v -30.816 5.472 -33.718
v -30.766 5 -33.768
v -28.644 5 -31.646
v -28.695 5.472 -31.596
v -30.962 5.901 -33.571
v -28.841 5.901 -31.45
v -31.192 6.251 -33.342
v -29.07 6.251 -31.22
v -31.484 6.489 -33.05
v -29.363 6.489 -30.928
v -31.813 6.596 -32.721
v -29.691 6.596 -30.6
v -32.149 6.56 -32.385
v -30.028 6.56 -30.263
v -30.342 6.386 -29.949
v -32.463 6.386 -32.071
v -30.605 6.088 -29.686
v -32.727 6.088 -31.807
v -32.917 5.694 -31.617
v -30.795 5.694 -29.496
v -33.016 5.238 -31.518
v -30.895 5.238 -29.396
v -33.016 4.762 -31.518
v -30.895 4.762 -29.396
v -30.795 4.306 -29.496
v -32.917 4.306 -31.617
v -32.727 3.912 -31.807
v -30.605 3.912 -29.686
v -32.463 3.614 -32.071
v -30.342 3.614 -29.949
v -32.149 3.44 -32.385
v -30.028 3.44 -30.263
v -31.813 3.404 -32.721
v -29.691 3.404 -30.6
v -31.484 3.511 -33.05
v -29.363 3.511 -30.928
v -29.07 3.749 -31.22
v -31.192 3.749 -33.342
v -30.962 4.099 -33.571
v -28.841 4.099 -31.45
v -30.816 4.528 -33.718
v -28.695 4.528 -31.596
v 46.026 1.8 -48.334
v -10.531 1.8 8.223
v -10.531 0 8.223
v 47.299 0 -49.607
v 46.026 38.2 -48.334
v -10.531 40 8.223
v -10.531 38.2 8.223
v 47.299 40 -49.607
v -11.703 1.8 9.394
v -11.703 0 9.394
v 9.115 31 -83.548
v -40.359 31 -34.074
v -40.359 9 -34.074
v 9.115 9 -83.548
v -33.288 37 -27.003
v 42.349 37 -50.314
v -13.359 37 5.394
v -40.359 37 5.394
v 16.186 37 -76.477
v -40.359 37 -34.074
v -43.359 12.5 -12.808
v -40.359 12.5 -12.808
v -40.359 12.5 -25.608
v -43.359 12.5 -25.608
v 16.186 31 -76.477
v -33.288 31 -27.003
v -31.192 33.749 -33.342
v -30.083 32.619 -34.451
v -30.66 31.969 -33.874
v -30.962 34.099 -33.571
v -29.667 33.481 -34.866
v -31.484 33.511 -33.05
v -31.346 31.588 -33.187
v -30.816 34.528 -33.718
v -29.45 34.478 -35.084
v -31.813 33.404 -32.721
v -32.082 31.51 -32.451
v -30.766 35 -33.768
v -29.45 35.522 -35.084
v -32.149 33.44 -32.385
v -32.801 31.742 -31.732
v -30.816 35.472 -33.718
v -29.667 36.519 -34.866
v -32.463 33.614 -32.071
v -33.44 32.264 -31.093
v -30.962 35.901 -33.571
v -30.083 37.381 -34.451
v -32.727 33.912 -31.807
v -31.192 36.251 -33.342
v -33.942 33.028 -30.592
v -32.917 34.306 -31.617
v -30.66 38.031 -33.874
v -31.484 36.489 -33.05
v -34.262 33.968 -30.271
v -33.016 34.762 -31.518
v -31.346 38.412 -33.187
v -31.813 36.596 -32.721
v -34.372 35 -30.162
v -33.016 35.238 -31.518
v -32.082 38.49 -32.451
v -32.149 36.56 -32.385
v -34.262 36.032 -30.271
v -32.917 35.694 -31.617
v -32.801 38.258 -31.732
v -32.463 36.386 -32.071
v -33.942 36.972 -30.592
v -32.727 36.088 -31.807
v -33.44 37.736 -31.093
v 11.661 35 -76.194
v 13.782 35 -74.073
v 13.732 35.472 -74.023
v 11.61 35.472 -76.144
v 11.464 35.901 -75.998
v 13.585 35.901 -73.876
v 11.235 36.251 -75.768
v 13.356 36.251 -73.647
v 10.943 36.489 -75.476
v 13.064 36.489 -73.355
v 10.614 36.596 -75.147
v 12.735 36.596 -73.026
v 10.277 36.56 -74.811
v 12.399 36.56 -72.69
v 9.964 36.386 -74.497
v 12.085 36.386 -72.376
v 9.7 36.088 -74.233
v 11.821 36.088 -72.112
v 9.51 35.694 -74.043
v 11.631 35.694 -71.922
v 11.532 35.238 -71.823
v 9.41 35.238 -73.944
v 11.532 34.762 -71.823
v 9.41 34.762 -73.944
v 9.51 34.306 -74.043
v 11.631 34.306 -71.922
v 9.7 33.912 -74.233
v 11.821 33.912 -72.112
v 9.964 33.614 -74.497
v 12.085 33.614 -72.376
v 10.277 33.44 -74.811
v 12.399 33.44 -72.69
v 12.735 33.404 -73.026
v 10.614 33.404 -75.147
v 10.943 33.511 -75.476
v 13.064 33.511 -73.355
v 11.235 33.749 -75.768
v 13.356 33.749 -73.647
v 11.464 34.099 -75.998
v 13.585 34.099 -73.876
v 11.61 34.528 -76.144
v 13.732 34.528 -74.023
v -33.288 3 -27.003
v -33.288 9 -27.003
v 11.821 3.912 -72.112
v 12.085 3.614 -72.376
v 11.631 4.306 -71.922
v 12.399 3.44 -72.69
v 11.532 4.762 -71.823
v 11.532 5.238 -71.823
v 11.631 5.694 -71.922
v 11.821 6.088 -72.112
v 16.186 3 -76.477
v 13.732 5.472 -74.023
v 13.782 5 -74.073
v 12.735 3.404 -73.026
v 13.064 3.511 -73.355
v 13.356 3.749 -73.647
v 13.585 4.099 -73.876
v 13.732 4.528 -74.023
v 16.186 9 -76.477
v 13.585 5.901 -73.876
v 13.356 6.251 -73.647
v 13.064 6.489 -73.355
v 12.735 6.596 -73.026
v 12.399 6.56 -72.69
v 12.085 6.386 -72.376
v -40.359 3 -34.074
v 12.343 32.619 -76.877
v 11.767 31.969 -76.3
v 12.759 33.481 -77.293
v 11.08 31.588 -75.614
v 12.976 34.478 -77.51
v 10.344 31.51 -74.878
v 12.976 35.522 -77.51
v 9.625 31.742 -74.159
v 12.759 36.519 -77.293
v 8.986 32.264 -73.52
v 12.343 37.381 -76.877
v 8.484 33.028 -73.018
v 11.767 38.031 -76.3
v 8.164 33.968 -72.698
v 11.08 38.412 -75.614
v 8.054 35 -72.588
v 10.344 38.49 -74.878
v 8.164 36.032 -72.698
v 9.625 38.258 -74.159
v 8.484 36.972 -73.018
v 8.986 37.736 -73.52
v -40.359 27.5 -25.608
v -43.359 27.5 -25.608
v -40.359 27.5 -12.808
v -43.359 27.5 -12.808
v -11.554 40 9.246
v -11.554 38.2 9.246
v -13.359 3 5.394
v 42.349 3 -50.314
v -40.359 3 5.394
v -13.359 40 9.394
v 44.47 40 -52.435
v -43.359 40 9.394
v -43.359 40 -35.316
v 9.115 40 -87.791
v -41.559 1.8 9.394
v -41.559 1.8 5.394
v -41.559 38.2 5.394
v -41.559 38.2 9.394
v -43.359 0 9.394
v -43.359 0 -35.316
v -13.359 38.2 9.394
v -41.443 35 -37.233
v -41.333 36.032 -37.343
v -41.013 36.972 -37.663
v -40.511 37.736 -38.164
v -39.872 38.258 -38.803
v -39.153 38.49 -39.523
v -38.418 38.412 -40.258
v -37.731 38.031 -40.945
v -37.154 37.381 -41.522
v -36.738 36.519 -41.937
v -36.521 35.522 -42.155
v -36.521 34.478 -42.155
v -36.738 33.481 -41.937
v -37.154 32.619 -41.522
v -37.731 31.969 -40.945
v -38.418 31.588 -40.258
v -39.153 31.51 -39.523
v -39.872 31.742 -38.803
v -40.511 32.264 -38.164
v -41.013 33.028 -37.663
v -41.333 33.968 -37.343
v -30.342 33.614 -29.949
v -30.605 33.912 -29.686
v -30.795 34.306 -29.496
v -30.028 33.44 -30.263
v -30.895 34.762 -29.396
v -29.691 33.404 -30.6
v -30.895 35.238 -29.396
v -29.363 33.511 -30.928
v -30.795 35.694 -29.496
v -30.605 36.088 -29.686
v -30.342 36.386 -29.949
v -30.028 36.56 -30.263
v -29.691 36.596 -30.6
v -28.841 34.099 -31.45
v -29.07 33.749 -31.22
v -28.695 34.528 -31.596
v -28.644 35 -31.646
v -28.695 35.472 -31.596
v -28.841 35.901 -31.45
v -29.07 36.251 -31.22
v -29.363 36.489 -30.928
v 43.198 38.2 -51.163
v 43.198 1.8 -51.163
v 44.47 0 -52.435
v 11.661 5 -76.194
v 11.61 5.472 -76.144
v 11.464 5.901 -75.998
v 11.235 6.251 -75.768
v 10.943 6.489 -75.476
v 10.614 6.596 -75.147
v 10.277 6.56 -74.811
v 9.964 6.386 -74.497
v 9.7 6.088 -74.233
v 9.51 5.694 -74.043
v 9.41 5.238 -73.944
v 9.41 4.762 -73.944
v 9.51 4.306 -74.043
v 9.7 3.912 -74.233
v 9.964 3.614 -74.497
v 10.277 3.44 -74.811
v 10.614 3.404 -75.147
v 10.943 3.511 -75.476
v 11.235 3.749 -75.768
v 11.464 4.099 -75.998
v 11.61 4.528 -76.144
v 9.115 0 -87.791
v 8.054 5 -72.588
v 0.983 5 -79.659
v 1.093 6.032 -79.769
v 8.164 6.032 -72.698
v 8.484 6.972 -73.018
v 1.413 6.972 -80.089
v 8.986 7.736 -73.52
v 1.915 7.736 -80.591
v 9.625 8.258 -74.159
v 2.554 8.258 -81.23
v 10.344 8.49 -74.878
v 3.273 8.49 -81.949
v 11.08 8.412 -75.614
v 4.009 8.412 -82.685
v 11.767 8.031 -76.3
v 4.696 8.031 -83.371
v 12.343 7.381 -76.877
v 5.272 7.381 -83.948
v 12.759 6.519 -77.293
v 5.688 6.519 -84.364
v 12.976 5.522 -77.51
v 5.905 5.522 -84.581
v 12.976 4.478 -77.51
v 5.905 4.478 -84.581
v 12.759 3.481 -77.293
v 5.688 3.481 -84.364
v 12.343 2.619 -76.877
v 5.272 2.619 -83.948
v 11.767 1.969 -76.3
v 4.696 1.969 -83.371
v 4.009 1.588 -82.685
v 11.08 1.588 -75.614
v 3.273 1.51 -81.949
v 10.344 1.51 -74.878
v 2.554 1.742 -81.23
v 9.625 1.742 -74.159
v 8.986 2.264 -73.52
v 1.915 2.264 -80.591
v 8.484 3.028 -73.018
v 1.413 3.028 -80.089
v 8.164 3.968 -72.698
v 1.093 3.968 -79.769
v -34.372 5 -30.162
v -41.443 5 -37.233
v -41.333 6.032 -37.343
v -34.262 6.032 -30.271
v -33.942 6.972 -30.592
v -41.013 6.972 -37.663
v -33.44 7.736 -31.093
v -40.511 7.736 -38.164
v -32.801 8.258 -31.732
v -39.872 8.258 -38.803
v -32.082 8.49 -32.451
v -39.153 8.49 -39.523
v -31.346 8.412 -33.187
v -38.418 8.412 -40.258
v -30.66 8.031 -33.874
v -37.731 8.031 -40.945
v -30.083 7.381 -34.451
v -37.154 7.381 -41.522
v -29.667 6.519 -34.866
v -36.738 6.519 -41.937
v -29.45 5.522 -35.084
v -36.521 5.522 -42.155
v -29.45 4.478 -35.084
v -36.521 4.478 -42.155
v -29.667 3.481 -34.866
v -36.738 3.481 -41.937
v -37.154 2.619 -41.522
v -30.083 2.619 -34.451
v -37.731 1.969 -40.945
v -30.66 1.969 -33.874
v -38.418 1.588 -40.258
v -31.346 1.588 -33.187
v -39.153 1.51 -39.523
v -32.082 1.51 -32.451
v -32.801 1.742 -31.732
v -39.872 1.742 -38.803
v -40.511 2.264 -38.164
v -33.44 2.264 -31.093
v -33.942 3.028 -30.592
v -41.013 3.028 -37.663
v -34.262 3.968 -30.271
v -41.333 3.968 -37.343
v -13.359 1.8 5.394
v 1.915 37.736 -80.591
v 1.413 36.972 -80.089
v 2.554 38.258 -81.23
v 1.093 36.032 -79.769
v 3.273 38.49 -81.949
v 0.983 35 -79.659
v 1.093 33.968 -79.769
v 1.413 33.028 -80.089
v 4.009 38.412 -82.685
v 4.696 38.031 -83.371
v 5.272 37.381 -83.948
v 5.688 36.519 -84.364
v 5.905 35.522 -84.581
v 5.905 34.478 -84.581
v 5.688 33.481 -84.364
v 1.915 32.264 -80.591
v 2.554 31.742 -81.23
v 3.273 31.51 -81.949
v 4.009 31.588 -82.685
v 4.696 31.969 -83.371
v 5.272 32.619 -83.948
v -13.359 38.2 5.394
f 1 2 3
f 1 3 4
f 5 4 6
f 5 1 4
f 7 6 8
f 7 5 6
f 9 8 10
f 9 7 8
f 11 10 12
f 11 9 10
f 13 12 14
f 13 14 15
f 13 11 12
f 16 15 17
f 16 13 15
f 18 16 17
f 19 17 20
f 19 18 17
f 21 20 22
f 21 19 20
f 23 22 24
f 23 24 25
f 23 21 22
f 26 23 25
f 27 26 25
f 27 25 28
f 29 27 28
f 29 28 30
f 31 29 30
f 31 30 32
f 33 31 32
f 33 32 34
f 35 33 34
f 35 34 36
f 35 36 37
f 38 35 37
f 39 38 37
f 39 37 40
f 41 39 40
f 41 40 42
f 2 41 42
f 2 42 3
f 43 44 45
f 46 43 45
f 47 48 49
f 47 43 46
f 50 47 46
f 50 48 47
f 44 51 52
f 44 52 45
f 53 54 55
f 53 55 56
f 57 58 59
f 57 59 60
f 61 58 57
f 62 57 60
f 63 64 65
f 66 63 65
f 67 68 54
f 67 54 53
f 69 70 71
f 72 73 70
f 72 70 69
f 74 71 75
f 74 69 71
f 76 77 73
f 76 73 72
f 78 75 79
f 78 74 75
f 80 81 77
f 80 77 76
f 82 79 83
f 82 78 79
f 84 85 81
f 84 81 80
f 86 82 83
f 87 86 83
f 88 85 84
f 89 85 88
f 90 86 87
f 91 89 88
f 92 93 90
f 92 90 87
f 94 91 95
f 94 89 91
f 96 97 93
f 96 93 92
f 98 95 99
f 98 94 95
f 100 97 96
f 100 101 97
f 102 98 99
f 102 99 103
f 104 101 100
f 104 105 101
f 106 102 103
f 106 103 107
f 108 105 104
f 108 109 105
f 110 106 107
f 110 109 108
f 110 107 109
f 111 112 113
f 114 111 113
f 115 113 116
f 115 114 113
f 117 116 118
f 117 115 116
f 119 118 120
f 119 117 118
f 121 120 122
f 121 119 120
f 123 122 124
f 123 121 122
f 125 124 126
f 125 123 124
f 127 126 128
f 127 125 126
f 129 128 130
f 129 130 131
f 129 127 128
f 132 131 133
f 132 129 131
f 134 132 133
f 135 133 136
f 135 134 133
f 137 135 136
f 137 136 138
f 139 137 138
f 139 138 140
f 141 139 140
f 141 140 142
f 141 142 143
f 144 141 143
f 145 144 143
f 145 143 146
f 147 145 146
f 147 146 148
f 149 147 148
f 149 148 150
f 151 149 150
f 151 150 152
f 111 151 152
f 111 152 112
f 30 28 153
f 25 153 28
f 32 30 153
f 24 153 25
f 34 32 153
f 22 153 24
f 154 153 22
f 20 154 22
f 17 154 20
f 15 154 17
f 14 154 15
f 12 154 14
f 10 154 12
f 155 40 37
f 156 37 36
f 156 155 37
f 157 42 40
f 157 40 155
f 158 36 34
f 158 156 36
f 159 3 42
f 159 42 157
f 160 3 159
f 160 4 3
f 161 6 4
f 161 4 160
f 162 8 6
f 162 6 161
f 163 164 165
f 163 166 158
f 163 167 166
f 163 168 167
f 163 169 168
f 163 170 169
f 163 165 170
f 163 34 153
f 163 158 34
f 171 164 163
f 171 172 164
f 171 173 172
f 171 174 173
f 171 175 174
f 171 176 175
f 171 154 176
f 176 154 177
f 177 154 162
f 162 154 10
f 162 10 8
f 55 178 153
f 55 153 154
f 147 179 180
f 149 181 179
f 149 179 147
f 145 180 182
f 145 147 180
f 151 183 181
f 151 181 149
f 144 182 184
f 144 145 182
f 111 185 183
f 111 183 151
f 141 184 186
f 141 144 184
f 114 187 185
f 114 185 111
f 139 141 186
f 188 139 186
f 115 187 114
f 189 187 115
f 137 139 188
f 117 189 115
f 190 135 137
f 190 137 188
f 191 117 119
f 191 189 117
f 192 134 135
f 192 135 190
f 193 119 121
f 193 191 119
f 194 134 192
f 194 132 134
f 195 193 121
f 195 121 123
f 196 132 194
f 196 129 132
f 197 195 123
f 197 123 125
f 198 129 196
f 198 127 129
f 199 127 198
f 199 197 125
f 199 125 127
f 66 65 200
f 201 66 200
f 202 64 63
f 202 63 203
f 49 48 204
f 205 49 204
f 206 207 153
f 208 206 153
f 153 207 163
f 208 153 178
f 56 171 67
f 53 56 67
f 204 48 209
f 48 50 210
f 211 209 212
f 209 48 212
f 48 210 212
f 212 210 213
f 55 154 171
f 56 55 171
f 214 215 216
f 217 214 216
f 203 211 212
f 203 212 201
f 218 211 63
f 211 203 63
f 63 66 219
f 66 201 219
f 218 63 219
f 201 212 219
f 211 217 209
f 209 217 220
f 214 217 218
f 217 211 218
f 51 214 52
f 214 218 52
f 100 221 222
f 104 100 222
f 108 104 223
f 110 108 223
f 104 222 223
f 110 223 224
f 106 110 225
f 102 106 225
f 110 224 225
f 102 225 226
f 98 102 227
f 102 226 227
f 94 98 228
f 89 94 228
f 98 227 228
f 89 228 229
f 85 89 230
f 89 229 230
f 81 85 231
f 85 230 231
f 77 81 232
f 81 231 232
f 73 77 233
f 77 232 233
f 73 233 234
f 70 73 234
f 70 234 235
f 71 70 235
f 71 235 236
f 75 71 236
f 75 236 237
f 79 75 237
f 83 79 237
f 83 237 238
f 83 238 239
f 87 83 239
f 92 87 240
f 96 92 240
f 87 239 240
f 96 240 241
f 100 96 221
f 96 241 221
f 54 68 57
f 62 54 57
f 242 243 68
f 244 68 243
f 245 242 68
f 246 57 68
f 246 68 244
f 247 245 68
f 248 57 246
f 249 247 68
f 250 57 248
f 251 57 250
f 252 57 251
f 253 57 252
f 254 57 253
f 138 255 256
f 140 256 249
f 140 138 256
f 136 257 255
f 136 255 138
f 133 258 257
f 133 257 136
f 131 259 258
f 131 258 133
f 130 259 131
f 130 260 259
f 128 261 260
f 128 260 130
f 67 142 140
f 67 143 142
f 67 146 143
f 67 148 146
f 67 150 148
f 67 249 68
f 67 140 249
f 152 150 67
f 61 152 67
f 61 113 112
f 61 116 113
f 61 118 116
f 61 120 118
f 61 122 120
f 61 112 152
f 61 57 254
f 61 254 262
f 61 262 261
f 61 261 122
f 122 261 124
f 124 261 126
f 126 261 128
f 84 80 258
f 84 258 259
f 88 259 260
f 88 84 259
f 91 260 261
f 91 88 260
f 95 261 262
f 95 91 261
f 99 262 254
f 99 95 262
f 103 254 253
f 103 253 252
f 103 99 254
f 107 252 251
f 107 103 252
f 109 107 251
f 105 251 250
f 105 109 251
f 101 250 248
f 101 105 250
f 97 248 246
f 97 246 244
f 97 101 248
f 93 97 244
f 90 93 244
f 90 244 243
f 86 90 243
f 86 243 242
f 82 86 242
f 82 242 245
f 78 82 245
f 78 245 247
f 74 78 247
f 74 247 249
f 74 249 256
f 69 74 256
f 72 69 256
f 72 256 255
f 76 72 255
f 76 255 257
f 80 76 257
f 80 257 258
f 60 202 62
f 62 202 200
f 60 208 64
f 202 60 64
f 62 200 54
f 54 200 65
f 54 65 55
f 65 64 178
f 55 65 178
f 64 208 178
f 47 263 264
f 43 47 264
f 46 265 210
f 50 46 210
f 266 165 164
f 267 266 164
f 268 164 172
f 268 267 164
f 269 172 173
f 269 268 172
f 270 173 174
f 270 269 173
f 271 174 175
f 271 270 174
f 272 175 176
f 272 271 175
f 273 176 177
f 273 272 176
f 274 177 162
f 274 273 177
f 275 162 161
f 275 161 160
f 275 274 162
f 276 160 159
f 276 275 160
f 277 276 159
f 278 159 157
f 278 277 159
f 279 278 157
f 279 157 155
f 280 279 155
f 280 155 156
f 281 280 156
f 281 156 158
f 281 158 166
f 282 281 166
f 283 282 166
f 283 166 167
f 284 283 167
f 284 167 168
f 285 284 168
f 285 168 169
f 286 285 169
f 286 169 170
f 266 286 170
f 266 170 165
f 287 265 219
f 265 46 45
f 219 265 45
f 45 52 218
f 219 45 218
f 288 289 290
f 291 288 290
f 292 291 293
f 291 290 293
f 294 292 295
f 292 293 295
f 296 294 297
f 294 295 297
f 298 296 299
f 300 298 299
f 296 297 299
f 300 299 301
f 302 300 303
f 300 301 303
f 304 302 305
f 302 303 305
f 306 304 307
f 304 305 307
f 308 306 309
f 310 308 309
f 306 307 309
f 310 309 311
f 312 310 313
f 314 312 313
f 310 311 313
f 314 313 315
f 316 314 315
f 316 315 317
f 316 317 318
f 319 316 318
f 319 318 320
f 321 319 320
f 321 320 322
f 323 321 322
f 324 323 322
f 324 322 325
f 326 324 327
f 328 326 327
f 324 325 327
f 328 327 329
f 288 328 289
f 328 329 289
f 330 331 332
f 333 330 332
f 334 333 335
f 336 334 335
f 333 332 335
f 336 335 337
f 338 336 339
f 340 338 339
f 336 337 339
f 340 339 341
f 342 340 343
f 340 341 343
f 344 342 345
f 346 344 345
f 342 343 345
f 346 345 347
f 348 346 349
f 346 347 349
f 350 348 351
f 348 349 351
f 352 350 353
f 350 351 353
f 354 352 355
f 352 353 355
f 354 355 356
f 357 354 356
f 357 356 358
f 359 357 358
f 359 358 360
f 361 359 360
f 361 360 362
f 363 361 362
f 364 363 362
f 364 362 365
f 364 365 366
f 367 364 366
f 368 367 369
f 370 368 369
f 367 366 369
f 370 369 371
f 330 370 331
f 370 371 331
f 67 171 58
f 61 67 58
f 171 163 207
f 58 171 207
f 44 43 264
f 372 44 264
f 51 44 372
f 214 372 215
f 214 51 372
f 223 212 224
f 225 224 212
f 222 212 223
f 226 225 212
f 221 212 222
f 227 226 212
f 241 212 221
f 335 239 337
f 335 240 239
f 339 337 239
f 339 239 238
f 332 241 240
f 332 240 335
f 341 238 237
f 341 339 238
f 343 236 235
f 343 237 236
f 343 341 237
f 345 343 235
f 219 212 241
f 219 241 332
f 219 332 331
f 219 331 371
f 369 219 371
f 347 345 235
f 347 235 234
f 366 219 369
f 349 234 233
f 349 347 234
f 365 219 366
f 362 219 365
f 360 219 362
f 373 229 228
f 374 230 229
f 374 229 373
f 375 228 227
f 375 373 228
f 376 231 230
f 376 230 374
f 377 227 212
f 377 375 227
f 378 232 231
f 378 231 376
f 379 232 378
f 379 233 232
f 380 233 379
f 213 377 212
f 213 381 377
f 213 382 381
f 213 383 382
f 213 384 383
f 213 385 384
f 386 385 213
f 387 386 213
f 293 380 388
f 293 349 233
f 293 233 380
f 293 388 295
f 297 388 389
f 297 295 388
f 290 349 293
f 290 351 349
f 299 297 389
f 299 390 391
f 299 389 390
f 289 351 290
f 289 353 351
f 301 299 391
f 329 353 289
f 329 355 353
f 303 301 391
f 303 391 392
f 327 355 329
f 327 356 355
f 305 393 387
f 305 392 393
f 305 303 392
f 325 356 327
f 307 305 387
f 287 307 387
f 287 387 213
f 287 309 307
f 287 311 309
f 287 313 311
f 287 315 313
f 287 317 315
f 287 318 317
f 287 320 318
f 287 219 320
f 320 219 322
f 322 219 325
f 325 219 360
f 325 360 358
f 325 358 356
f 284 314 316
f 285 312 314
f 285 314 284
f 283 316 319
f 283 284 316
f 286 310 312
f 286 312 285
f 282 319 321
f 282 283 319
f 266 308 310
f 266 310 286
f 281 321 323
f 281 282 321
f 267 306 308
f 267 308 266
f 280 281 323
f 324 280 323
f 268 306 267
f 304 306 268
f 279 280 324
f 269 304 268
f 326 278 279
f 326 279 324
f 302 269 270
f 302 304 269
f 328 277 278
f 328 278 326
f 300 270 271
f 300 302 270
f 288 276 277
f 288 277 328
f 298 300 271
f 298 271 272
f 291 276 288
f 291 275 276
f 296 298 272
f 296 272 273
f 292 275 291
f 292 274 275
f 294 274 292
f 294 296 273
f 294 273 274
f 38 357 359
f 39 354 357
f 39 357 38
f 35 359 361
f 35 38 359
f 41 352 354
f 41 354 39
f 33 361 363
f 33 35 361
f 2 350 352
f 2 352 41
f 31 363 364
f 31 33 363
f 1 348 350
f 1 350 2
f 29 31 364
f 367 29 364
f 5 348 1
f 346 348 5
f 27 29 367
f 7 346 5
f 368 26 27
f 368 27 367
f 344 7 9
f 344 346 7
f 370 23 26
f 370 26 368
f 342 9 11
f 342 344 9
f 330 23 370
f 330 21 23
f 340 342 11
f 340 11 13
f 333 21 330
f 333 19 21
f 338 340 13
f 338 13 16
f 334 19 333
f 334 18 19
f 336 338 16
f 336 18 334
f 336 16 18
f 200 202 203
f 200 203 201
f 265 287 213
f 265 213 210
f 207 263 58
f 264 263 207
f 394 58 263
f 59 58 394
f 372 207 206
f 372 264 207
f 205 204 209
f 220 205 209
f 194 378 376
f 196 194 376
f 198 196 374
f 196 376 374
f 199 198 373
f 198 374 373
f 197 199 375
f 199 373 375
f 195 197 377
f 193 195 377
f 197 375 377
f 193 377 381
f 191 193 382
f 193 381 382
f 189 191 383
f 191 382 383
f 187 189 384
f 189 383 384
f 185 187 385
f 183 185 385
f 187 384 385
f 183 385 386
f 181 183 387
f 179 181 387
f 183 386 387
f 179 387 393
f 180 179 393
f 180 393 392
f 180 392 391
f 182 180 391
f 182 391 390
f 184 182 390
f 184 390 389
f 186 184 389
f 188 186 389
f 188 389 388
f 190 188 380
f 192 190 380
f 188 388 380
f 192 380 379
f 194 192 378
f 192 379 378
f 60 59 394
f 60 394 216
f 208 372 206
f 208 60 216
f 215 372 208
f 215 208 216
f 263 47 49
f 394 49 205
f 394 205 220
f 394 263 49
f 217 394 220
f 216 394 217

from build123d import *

# Parameters (mm, degrees)
BOSS_EXTRUDE1_DEPTH = 40
SHELL1_T            = -3
BOSS_EXTRUDE2_DEPTH = 4
BOSS_EXTRUDE3_DEPTH = 4
BOSS_EXTRUDE4_DEPTH = 1.8
BOSS_EXTRUDE5_DEPTH = 1.8
SKETCH10_R          = 1.65
CUT_EXTRUDE6_DEPTH  = 41.105
SKETCH11_W          = 12.8
SKETCH11_H          = 15
CUT_EXTRUDE7_DEPTH  = 3
SKETCH12_W          = 69.967359313
SKETCH12_H          = 34
SKETCH12_R          = 1.6
BOSS_EXTRUDE7_DEPTH = 10
SKETCH13_R          = 3.5
CUT_EXTRUDE9_DEPTH  = 10
SKETCH14_W          = 69.967359313
SKETCH14_H          = 22
CUT_EXTRUDE10_DEPTH = 10


with BuildPart() as part:
    # Sketch1 → Boss-Extrude1 (new body)
    with BuildSketch(Plane(origin=(0, 0, 0), x_dir=(1, 0, 0), z_dir=(0, 1, 0))):
        Polygon((-43.359374855, -5.394325428), (-43.359374855, 35.316352691), (9.115019377, 87.790746923), (44.470358437, 52.435407864), (-13.359374855, -5.394325428), align=None)
    extrude(amount=BOSS_EXTRUDE1_DEPTH)

    # Shell1
    shell1_openings = [part.faces().sort_by_distance(p)[0] for p in [
        (15.555491791, 20, -23.520541218),
        (-28.359374855, 20, 5.394325428),
    ]]
    offset(amount=SHELL1_T, openings=shell1_openings, kind=Kind.INTERSECTION)

    # Sketch6 → Boss-Extrude2 (add)
    with BuildSketch(Plane(origin=(-3.982524714, 0, -3.982524714), x_dir=(0.707106781, 0, -0.707106781), z_dir=(0.707106781, 0, 0.707106781))):
        Polygon((-13.260868642, 38.2), (66.722724487, 38.2), (66.722724487, 1.8), (-13.260868642, 1.8), (-13.260868642, 0), (68.522724487, 0), (68.522724487, 40), (-13.260868642, 40), align=None)
    extrude(amount=BOSS_EXTRUDE2_DEPTH)

    # Sketch7 → Boss-Extrude3 (add)
    with BuildSketch(Plane.XY.offset(5.394325428)):
        Polygon((-13.359374855, 1.8), (-41.559374855, 1.8), (-41.559374855, 38.2), (-13.359374855, 38.2), (-13.359374855, 40), (-43.359374855, 40), (-43.359374855, 0), (-13.359374855, 0), align=None)
    extrude(amount=BOSS_EXTRUDE3_DEPTH)

    # Sketch8 → Boss-Extrude4 (add)
    with BuildSketch(Plane.XZ):
        Polygon((-13.359374855, 9.394325428), (-11.702520605, 9.394325428), (-10.53094773, 8.222752552), (-13.359374855, 5.394325428), align=None)
    extrude(amount=-BOSS_EXTRUDE4_DEPTH)

    # Sketch9 → Boss-Extrude5 (add)
    with BuildSketch(Plane(origin=(0, 40, 0), x_dir=(1, 0, 0), z_dir=(0, 1, 0))):
        Polygon((-13.359374855, -5.394325428), (-10.53094773, -8.222752552), (-11.553745116, -9.245549939), (-13.359374855, -9.394325428), align=None)
    extrude(amount=-BOSS_EXTRUDE5_DEPTH)

    # Sketch10 → Cut-Extrude6 (cut, through all)
    with BuildSketch(Plane(origin=(-37.216543429, 0, -37.216543429), x_dir=(0.707106781, 0, -0.707106781), z_dir=(0.707106781, 0, 0.707106781))):
        with Locations((60.522724487, 35)):
            Circle(SKETCH10_R)
        with Locations((60.522724487, 5)):
            Circle(SKETCH10_R)
        with Locations((0.522724487, 35)):
            Circle(SKETCH10_R)
        with Locations((0.522724487, 5)):
            Circle(SKETCH10_R)
    extrude(amount=-CUT_EXTRUDE6_DEPTH, mode=Mode.SUBTRACT)

    # Sketch11 → Cut-Extrude7 (cut)
    with BuildSketch(Plane(origin=(-40.359374855, 0, 0), x_dir=(0, 0, -1), z_dir=(1, 0, 0))):
        with Locations((19.207640819, 20)):
            Rectangle(SKETCH11_W, SKETCH11_H)
    extrude(amount=-CUT_EXTRUDE7_DEPTH, mode=Mode.SUBTRACT)

    # Sketch12 → Boss-Extrude7 (add)
    with BuildSketch(Plane(origin=(-37.216543429, 0, -37.216543429), x_dir=(0.707106781, 0, -0.707106781), z_dir=(0.707106781, 0, 0.707106781))):
        with Locations((30.539044831, 20)):
            Rectangle(SKETCH12_W, SKETCH12_H)
        with Locations((0.522724487, 35)):
            Circle(SKETCH12_R, mode=Mode.SUBTRACT)
        with Locations((60.522724487, 35)):
            Circle(SKETCH12_R, mode=Mode.SUBTRACT)
        with Locations((60.522724487, 5)):
            Circle(SKETCH12_R, mode=Mode.SUBTRACT)
        with Locations((0.522724487, 5)):
            Circle(SKETCH12_R, mode=Mode.SUBTRACT)
    extrude(amount=BOSS_EXTRUDE7_DEPTH)

    # Sketch13 → Cut-Extrude9 (cut)
    with BuildSketch(Plane(origin=(-39.337863773, 0, -39.337863773), x_dir=(-0.707106781, 0, 0.707106781), z_dir=(-0.707106781, 0, -0.707106781))):
        with Locations((-0.522724487, 35)):
            Circle(SKETCH13_R)
        with Locations((-0.522724487, 5)):
            Circle(SKETCH13_R)
        with Locations((-60.522724487, 5)):
            Circle(SKETCH13_R)
        with Locations((-60.522724487, 35)):
            Circle(SKETCH13_R)
    extrude(amount=-CUT_EXTRUDE9_DEPTH, mode=Mode.SUBTRACT)

    # Sketch14 → Cut-Extrude10 (cut)
    with BuildSketch(Plane(origin=(-30.145475617, 0, -30.145475617), x_dir=(0.707106781, 0, -0.707106781), z_dir=(0.707106781, 0, 0.707106781))):
        with Locations((30.539044831, 20)):
            Rectangle(SKETCH14_W, SKETCH14_H)
    extrude(amount=-CUT_EXTRUDE10_DEPTH, mode=Mode.SUBTRACT)


solid = part.part
